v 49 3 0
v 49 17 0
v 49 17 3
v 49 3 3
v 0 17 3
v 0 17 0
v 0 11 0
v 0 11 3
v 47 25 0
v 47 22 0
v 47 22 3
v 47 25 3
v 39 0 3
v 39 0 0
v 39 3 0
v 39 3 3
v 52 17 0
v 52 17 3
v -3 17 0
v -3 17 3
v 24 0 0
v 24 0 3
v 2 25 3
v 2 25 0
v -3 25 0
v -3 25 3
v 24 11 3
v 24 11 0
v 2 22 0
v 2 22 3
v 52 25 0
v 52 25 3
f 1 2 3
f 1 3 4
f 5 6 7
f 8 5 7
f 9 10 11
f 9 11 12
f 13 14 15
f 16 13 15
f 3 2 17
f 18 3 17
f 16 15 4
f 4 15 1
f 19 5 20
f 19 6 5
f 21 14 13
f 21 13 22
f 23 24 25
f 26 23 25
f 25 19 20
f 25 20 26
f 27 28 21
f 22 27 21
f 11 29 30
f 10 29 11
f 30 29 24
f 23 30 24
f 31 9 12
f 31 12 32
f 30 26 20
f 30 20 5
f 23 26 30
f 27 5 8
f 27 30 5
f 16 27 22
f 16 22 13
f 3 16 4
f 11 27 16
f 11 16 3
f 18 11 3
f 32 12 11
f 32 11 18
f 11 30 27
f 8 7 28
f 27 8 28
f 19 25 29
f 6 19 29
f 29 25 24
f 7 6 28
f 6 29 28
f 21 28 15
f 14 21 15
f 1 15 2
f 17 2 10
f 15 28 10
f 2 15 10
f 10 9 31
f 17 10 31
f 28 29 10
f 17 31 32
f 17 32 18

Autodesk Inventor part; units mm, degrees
ref_plane "YZ Plane" through (0, 0, 0) normal (1, 0, 0) x (0, 1, 0)
ref_plane "XZ Plane" through (0, 0, 0) normal (0, 1, 0) x (-1, 0, 0)
ref_plane "XY Plane" through (0, 0, 0) normal (0, 0, 1) x (1, 0, 0)
sketch "Sketch1" plane through (0, 0, 0) normal (0, 0, 1) x (1, 0, 0)
  line L0 (39, 0) -> (25, 0) projected
  line L1 (25, 0) -> (24, 0) projected
  line L2 (24, 11) -> (24, 0) projected
  line L3 (16.5, 11) -> (24, 11) projected
  line L4 (-3, 11) -> (16.5, 11) projected
  line L5 (0, 17) -> (0, 25)
  line L6 (49, 25) -> (49, 17) projected
  line L7 (49, 17) -> (52, 17) projected
  line L8 (52, 25) -> (52, 17) projected
  line L9 (49, 25) -> (52, 25) projected
  line L10 (49, 17) -> (49, 0) projected
  line L11 (39, 3) -> (49, 3) projected
  line L12 (39, 0) -> (39, 3) projected
  line L13 (0, 17) -> (0, 11)
  line L14 (2, 22) -> (2, 25)
  line L15 (2, 25) -> (0, 25)
  line L16 (0, 25) -> (0, 20)
  line L17 (47, 22) -> (47, 25)
  line L18 (47, 25) -> (49, 25)
  line L19 (0, 17) -> (0, 25) projected
  line L20 (0, 25) -> (-3, 25) projected
  line L21 (-3, 17) -> (-3, 25) projected
  line L22 (0, 17) -> (-3, 17) projected
  line L23 (2, 22) -> (47, 22)
  point P0 (0, 0)
  dimension "d2" = 5
  dimension "d4" = 5
  dimension "d5" = 3
extrude "Extrusion1" add sketch "Sketch1" along normal blind 3
properties part number "SideBottomNM" material "Acrylic, Clear"
